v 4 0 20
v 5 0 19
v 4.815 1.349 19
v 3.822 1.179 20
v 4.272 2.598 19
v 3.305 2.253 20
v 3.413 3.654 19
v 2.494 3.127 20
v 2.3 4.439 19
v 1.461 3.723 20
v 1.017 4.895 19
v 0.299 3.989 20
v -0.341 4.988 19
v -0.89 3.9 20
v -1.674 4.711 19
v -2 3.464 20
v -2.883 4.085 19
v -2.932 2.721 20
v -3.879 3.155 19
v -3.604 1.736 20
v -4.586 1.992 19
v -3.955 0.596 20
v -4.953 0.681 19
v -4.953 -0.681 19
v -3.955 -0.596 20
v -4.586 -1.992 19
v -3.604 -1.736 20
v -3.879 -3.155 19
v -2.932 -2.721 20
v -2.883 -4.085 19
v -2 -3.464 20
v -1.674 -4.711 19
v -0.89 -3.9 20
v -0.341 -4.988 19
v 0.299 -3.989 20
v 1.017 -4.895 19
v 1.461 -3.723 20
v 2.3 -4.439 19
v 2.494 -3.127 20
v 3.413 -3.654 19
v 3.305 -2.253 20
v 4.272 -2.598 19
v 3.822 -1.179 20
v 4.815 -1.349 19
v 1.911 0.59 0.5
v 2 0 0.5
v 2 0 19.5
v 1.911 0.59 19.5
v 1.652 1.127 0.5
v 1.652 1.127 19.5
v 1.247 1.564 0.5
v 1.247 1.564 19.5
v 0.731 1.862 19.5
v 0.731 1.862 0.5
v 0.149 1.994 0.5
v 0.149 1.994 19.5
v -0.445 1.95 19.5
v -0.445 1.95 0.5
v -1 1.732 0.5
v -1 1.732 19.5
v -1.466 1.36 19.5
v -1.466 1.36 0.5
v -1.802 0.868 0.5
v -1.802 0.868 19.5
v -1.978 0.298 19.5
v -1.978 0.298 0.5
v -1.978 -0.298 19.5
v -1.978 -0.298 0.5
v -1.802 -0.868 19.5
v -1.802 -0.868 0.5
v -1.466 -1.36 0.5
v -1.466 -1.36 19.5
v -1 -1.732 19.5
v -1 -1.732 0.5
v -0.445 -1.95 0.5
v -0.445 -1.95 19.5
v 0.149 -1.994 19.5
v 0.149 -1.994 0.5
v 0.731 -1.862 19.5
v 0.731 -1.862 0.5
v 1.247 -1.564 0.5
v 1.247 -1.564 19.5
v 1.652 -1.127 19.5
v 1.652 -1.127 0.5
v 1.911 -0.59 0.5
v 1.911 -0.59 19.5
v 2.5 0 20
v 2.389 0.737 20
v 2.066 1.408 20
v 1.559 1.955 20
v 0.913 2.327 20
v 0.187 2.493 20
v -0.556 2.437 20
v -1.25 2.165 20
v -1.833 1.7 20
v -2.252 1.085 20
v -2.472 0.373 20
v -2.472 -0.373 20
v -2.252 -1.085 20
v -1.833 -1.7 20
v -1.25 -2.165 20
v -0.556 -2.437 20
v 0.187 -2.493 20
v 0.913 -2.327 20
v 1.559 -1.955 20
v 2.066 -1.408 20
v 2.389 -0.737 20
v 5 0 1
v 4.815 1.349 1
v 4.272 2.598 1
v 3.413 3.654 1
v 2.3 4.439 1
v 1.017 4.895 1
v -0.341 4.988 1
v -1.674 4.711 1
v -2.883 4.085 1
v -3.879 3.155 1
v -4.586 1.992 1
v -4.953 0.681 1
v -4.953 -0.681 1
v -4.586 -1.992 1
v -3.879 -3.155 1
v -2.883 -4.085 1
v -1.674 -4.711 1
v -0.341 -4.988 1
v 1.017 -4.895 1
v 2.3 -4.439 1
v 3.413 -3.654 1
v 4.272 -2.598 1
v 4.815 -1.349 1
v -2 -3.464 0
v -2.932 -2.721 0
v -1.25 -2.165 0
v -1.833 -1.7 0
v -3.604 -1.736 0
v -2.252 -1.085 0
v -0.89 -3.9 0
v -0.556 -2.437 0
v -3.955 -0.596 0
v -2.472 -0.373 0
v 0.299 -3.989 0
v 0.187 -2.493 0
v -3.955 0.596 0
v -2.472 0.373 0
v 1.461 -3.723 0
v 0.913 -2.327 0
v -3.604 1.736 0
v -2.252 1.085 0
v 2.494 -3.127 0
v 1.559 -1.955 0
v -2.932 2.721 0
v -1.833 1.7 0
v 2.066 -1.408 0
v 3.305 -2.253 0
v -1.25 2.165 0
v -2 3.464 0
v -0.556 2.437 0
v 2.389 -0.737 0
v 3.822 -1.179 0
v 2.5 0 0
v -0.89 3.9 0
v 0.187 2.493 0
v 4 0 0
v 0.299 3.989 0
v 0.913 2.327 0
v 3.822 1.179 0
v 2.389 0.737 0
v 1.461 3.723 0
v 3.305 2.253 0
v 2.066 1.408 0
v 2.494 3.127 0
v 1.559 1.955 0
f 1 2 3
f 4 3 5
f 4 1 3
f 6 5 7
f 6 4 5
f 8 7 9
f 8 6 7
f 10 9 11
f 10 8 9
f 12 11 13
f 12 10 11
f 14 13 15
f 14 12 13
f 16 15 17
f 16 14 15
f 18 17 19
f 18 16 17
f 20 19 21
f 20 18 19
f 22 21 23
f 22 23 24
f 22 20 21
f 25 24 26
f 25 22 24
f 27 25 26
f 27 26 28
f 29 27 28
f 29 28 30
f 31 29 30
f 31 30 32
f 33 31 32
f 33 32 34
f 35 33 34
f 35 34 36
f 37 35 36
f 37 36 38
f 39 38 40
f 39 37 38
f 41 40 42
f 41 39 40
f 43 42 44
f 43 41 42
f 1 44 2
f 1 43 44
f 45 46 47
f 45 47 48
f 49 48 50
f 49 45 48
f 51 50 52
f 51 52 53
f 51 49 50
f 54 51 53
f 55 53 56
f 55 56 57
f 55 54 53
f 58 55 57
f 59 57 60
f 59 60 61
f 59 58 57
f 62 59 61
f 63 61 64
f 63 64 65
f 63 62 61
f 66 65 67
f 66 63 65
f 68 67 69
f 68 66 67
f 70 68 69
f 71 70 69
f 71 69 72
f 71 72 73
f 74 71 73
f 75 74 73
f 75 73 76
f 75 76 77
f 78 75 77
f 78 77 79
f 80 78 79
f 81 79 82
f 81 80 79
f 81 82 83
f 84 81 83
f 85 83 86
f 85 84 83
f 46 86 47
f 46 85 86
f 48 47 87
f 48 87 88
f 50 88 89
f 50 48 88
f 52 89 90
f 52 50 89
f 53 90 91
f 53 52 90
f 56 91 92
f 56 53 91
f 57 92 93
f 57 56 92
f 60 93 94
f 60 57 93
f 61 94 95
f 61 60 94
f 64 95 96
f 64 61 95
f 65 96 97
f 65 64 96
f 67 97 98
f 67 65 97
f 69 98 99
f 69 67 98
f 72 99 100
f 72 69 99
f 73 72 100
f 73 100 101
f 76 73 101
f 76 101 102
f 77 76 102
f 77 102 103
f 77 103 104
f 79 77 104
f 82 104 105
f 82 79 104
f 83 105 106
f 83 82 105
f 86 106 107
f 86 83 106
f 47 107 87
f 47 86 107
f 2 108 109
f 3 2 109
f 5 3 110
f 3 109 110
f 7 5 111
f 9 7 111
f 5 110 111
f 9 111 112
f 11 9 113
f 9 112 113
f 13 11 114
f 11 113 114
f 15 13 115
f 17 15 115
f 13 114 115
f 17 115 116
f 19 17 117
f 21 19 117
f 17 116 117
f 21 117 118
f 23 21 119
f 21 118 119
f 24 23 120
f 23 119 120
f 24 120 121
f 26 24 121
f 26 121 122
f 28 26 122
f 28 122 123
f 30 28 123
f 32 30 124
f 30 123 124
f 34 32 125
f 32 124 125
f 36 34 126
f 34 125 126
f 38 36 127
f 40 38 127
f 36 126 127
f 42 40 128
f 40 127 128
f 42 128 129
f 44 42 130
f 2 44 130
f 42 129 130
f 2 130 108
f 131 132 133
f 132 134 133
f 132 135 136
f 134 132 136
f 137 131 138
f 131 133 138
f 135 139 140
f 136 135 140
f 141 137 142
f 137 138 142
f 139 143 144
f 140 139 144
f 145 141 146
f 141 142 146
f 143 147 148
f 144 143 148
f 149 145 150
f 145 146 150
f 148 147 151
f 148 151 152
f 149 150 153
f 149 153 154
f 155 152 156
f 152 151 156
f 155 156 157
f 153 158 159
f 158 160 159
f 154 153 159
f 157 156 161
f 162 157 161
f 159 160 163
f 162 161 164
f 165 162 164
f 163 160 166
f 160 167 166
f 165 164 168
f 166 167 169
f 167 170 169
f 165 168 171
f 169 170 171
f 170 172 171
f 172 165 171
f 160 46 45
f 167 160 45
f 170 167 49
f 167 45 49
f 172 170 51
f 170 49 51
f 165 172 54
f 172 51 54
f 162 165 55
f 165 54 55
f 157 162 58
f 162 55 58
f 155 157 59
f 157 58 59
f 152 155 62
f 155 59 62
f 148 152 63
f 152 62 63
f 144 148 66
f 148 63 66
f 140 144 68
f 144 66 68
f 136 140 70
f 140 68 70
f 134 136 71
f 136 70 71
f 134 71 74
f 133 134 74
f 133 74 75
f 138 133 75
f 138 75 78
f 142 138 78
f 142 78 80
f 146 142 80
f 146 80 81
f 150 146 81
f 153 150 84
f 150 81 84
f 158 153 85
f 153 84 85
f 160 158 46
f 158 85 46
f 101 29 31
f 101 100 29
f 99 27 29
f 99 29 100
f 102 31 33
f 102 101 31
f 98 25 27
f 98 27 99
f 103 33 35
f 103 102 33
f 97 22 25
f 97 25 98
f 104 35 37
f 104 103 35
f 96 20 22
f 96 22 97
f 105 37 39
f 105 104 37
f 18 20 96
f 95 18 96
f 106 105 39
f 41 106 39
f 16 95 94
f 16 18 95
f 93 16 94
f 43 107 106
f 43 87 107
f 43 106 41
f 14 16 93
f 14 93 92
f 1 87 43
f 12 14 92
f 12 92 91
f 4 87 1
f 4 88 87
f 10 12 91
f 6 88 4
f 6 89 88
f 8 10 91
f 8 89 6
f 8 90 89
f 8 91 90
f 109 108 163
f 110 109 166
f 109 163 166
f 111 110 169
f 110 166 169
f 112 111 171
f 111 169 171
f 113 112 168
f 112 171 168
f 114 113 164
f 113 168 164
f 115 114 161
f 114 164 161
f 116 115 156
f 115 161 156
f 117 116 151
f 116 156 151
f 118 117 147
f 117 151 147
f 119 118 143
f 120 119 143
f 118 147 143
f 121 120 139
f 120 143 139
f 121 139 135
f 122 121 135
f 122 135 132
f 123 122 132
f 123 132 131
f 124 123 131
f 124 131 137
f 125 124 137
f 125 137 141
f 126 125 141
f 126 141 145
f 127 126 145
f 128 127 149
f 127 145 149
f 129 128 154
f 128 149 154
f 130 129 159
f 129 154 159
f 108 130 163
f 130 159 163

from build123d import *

# Parameters (mm, degrees)
ESQUISSE1_R          = 5
ESQUISSE1_R_2        = 2
BASE_EXTRUSION_DEPTH = 20
CHANFREIN1_SIZE      = 1
CHANFREIN2_SIZE      = 0.5


with BuildPart() as part:
    # Esquisse1 → Base-Extrusion (new body)
    with BuildSketch(Plane.XY):
        Circle(ESQUISSE1_R)
        Circle(ESQUISSE1_R_2, mode=Mode.SUBTRACT)
    extrude(amount=BASE_EXTRUSION_DEPTH)

    # Chanfrein1
    chanfrein1_edges = [part.edges().sort_by_distance(p)[0] for p in [
        (-5, 0, 0),
        (-5, 0, 20),
    ]]
    chamfer(chanfrein1_edges, length=CHANFREIN1_SIZE)

    # Chanfrein2
    chanfrein2_edges = [part.edges().sort_by_distance(p)[0] for p in [
        (-2, 0, 0),
        (-2, 0, 20),
    ]]
    chamfer(chanfrein2_edges, length=CHANFREIN2_SIZE)


solid = part.part
